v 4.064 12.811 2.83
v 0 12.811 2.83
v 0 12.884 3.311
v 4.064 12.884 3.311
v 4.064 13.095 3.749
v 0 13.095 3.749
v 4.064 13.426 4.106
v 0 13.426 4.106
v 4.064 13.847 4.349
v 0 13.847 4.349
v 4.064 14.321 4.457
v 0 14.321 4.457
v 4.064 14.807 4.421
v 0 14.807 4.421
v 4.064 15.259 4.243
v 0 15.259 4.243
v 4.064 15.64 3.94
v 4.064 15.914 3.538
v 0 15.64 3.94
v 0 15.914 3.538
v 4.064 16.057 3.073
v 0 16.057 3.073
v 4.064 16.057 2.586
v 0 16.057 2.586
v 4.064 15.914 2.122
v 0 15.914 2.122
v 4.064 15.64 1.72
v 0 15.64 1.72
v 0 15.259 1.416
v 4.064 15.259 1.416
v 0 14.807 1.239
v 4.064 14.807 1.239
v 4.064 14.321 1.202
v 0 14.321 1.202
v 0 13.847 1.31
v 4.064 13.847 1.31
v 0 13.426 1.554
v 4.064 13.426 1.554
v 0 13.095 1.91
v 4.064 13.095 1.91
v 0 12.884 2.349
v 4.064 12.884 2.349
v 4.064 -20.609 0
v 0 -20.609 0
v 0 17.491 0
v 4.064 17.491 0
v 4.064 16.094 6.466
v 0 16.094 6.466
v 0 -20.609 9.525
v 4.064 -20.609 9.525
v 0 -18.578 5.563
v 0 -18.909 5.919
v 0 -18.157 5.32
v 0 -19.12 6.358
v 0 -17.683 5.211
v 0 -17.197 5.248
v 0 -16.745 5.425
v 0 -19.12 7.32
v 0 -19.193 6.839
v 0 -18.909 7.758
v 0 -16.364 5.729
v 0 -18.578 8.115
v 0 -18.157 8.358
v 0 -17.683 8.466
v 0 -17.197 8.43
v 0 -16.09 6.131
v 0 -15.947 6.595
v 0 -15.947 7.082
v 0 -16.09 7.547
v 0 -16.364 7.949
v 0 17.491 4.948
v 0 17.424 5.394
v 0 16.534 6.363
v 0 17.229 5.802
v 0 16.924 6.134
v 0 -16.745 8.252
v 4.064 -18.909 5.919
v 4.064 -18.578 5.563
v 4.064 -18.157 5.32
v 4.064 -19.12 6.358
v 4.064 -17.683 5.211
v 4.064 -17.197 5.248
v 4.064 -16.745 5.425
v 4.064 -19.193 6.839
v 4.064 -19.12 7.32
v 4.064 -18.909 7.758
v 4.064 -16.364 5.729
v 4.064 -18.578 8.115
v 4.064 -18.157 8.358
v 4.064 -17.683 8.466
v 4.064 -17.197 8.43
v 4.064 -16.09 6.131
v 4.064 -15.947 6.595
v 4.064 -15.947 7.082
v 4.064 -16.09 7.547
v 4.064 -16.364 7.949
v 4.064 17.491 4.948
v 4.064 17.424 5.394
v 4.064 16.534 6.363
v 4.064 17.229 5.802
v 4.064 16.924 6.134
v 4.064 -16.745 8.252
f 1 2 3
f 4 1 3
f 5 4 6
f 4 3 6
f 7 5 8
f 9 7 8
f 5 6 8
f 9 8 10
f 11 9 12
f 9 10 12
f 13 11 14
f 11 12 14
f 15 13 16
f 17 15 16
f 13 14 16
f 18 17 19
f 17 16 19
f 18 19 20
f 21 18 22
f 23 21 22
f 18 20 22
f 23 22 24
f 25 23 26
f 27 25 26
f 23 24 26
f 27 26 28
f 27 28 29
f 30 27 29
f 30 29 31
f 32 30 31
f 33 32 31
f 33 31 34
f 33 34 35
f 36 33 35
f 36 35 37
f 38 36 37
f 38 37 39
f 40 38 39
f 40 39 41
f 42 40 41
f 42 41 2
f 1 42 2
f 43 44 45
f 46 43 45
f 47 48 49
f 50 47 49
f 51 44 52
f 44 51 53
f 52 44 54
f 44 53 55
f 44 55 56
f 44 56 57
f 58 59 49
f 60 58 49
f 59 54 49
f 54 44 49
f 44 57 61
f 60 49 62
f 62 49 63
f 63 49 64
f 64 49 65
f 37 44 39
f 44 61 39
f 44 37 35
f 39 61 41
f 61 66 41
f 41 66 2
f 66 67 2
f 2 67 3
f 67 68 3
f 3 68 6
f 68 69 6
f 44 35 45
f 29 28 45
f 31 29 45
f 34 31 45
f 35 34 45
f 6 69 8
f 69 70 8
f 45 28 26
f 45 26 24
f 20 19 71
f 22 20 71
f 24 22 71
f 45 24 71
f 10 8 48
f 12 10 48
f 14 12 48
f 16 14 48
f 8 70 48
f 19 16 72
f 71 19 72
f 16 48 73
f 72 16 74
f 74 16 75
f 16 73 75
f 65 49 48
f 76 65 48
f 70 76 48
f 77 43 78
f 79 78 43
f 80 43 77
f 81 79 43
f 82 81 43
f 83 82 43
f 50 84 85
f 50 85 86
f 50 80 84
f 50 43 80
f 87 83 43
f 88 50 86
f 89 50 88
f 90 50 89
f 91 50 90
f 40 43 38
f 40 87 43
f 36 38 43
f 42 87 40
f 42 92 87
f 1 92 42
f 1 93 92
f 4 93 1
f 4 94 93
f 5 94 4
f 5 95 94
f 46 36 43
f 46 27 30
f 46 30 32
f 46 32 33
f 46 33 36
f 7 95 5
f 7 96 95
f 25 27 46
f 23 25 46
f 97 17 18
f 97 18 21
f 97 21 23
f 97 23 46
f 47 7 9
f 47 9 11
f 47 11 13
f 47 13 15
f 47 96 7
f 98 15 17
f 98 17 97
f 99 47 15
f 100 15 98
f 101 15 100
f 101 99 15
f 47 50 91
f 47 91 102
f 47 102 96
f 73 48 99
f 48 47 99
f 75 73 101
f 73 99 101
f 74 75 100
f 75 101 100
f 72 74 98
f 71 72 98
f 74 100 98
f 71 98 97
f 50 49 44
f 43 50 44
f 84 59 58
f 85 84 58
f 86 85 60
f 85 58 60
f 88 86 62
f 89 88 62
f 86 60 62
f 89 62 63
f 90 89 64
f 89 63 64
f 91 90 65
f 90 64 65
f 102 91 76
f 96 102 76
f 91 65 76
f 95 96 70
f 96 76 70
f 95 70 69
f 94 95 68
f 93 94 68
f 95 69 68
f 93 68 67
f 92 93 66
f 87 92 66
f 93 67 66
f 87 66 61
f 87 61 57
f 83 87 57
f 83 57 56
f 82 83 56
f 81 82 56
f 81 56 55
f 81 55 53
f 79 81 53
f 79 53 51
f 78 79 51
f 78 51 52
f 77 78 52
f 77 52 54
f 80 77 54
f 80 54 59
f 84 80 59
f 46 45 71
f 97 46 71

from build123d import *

# Parameters (mm, degrees)
F1_DEPTH = 4.064
F3_D     = 3.2639
F4_R     = 1.524


with BuildPart() as f1:
    # F0 (on Right) → F1 (new body)
    with BuildSketch(Plane.YZ):
        Polygon((-20.6086377689, 9.525), (-20.6086377689, 0), (17.4913622311, 0), (17.4913622311, 6.35), align=None)
    extrude(amount=F1_DEPTH)

    # F3 (through all)
    with Locations(Plane.YZ.offset(4.064)):
        with Locations((-17.5606377689, 6.8387051621), (14.4433622311, 2.8296108316)):
            Hole(F3_D / 2)

    # F4
    f4_edges = [f1.edges().sort_by_distance(p)[0] for p in [
        (2.032, 17.491362, 6.35),
    ]]
    fillet(f4_edges, radius=F4_R)


solid = f1.part
